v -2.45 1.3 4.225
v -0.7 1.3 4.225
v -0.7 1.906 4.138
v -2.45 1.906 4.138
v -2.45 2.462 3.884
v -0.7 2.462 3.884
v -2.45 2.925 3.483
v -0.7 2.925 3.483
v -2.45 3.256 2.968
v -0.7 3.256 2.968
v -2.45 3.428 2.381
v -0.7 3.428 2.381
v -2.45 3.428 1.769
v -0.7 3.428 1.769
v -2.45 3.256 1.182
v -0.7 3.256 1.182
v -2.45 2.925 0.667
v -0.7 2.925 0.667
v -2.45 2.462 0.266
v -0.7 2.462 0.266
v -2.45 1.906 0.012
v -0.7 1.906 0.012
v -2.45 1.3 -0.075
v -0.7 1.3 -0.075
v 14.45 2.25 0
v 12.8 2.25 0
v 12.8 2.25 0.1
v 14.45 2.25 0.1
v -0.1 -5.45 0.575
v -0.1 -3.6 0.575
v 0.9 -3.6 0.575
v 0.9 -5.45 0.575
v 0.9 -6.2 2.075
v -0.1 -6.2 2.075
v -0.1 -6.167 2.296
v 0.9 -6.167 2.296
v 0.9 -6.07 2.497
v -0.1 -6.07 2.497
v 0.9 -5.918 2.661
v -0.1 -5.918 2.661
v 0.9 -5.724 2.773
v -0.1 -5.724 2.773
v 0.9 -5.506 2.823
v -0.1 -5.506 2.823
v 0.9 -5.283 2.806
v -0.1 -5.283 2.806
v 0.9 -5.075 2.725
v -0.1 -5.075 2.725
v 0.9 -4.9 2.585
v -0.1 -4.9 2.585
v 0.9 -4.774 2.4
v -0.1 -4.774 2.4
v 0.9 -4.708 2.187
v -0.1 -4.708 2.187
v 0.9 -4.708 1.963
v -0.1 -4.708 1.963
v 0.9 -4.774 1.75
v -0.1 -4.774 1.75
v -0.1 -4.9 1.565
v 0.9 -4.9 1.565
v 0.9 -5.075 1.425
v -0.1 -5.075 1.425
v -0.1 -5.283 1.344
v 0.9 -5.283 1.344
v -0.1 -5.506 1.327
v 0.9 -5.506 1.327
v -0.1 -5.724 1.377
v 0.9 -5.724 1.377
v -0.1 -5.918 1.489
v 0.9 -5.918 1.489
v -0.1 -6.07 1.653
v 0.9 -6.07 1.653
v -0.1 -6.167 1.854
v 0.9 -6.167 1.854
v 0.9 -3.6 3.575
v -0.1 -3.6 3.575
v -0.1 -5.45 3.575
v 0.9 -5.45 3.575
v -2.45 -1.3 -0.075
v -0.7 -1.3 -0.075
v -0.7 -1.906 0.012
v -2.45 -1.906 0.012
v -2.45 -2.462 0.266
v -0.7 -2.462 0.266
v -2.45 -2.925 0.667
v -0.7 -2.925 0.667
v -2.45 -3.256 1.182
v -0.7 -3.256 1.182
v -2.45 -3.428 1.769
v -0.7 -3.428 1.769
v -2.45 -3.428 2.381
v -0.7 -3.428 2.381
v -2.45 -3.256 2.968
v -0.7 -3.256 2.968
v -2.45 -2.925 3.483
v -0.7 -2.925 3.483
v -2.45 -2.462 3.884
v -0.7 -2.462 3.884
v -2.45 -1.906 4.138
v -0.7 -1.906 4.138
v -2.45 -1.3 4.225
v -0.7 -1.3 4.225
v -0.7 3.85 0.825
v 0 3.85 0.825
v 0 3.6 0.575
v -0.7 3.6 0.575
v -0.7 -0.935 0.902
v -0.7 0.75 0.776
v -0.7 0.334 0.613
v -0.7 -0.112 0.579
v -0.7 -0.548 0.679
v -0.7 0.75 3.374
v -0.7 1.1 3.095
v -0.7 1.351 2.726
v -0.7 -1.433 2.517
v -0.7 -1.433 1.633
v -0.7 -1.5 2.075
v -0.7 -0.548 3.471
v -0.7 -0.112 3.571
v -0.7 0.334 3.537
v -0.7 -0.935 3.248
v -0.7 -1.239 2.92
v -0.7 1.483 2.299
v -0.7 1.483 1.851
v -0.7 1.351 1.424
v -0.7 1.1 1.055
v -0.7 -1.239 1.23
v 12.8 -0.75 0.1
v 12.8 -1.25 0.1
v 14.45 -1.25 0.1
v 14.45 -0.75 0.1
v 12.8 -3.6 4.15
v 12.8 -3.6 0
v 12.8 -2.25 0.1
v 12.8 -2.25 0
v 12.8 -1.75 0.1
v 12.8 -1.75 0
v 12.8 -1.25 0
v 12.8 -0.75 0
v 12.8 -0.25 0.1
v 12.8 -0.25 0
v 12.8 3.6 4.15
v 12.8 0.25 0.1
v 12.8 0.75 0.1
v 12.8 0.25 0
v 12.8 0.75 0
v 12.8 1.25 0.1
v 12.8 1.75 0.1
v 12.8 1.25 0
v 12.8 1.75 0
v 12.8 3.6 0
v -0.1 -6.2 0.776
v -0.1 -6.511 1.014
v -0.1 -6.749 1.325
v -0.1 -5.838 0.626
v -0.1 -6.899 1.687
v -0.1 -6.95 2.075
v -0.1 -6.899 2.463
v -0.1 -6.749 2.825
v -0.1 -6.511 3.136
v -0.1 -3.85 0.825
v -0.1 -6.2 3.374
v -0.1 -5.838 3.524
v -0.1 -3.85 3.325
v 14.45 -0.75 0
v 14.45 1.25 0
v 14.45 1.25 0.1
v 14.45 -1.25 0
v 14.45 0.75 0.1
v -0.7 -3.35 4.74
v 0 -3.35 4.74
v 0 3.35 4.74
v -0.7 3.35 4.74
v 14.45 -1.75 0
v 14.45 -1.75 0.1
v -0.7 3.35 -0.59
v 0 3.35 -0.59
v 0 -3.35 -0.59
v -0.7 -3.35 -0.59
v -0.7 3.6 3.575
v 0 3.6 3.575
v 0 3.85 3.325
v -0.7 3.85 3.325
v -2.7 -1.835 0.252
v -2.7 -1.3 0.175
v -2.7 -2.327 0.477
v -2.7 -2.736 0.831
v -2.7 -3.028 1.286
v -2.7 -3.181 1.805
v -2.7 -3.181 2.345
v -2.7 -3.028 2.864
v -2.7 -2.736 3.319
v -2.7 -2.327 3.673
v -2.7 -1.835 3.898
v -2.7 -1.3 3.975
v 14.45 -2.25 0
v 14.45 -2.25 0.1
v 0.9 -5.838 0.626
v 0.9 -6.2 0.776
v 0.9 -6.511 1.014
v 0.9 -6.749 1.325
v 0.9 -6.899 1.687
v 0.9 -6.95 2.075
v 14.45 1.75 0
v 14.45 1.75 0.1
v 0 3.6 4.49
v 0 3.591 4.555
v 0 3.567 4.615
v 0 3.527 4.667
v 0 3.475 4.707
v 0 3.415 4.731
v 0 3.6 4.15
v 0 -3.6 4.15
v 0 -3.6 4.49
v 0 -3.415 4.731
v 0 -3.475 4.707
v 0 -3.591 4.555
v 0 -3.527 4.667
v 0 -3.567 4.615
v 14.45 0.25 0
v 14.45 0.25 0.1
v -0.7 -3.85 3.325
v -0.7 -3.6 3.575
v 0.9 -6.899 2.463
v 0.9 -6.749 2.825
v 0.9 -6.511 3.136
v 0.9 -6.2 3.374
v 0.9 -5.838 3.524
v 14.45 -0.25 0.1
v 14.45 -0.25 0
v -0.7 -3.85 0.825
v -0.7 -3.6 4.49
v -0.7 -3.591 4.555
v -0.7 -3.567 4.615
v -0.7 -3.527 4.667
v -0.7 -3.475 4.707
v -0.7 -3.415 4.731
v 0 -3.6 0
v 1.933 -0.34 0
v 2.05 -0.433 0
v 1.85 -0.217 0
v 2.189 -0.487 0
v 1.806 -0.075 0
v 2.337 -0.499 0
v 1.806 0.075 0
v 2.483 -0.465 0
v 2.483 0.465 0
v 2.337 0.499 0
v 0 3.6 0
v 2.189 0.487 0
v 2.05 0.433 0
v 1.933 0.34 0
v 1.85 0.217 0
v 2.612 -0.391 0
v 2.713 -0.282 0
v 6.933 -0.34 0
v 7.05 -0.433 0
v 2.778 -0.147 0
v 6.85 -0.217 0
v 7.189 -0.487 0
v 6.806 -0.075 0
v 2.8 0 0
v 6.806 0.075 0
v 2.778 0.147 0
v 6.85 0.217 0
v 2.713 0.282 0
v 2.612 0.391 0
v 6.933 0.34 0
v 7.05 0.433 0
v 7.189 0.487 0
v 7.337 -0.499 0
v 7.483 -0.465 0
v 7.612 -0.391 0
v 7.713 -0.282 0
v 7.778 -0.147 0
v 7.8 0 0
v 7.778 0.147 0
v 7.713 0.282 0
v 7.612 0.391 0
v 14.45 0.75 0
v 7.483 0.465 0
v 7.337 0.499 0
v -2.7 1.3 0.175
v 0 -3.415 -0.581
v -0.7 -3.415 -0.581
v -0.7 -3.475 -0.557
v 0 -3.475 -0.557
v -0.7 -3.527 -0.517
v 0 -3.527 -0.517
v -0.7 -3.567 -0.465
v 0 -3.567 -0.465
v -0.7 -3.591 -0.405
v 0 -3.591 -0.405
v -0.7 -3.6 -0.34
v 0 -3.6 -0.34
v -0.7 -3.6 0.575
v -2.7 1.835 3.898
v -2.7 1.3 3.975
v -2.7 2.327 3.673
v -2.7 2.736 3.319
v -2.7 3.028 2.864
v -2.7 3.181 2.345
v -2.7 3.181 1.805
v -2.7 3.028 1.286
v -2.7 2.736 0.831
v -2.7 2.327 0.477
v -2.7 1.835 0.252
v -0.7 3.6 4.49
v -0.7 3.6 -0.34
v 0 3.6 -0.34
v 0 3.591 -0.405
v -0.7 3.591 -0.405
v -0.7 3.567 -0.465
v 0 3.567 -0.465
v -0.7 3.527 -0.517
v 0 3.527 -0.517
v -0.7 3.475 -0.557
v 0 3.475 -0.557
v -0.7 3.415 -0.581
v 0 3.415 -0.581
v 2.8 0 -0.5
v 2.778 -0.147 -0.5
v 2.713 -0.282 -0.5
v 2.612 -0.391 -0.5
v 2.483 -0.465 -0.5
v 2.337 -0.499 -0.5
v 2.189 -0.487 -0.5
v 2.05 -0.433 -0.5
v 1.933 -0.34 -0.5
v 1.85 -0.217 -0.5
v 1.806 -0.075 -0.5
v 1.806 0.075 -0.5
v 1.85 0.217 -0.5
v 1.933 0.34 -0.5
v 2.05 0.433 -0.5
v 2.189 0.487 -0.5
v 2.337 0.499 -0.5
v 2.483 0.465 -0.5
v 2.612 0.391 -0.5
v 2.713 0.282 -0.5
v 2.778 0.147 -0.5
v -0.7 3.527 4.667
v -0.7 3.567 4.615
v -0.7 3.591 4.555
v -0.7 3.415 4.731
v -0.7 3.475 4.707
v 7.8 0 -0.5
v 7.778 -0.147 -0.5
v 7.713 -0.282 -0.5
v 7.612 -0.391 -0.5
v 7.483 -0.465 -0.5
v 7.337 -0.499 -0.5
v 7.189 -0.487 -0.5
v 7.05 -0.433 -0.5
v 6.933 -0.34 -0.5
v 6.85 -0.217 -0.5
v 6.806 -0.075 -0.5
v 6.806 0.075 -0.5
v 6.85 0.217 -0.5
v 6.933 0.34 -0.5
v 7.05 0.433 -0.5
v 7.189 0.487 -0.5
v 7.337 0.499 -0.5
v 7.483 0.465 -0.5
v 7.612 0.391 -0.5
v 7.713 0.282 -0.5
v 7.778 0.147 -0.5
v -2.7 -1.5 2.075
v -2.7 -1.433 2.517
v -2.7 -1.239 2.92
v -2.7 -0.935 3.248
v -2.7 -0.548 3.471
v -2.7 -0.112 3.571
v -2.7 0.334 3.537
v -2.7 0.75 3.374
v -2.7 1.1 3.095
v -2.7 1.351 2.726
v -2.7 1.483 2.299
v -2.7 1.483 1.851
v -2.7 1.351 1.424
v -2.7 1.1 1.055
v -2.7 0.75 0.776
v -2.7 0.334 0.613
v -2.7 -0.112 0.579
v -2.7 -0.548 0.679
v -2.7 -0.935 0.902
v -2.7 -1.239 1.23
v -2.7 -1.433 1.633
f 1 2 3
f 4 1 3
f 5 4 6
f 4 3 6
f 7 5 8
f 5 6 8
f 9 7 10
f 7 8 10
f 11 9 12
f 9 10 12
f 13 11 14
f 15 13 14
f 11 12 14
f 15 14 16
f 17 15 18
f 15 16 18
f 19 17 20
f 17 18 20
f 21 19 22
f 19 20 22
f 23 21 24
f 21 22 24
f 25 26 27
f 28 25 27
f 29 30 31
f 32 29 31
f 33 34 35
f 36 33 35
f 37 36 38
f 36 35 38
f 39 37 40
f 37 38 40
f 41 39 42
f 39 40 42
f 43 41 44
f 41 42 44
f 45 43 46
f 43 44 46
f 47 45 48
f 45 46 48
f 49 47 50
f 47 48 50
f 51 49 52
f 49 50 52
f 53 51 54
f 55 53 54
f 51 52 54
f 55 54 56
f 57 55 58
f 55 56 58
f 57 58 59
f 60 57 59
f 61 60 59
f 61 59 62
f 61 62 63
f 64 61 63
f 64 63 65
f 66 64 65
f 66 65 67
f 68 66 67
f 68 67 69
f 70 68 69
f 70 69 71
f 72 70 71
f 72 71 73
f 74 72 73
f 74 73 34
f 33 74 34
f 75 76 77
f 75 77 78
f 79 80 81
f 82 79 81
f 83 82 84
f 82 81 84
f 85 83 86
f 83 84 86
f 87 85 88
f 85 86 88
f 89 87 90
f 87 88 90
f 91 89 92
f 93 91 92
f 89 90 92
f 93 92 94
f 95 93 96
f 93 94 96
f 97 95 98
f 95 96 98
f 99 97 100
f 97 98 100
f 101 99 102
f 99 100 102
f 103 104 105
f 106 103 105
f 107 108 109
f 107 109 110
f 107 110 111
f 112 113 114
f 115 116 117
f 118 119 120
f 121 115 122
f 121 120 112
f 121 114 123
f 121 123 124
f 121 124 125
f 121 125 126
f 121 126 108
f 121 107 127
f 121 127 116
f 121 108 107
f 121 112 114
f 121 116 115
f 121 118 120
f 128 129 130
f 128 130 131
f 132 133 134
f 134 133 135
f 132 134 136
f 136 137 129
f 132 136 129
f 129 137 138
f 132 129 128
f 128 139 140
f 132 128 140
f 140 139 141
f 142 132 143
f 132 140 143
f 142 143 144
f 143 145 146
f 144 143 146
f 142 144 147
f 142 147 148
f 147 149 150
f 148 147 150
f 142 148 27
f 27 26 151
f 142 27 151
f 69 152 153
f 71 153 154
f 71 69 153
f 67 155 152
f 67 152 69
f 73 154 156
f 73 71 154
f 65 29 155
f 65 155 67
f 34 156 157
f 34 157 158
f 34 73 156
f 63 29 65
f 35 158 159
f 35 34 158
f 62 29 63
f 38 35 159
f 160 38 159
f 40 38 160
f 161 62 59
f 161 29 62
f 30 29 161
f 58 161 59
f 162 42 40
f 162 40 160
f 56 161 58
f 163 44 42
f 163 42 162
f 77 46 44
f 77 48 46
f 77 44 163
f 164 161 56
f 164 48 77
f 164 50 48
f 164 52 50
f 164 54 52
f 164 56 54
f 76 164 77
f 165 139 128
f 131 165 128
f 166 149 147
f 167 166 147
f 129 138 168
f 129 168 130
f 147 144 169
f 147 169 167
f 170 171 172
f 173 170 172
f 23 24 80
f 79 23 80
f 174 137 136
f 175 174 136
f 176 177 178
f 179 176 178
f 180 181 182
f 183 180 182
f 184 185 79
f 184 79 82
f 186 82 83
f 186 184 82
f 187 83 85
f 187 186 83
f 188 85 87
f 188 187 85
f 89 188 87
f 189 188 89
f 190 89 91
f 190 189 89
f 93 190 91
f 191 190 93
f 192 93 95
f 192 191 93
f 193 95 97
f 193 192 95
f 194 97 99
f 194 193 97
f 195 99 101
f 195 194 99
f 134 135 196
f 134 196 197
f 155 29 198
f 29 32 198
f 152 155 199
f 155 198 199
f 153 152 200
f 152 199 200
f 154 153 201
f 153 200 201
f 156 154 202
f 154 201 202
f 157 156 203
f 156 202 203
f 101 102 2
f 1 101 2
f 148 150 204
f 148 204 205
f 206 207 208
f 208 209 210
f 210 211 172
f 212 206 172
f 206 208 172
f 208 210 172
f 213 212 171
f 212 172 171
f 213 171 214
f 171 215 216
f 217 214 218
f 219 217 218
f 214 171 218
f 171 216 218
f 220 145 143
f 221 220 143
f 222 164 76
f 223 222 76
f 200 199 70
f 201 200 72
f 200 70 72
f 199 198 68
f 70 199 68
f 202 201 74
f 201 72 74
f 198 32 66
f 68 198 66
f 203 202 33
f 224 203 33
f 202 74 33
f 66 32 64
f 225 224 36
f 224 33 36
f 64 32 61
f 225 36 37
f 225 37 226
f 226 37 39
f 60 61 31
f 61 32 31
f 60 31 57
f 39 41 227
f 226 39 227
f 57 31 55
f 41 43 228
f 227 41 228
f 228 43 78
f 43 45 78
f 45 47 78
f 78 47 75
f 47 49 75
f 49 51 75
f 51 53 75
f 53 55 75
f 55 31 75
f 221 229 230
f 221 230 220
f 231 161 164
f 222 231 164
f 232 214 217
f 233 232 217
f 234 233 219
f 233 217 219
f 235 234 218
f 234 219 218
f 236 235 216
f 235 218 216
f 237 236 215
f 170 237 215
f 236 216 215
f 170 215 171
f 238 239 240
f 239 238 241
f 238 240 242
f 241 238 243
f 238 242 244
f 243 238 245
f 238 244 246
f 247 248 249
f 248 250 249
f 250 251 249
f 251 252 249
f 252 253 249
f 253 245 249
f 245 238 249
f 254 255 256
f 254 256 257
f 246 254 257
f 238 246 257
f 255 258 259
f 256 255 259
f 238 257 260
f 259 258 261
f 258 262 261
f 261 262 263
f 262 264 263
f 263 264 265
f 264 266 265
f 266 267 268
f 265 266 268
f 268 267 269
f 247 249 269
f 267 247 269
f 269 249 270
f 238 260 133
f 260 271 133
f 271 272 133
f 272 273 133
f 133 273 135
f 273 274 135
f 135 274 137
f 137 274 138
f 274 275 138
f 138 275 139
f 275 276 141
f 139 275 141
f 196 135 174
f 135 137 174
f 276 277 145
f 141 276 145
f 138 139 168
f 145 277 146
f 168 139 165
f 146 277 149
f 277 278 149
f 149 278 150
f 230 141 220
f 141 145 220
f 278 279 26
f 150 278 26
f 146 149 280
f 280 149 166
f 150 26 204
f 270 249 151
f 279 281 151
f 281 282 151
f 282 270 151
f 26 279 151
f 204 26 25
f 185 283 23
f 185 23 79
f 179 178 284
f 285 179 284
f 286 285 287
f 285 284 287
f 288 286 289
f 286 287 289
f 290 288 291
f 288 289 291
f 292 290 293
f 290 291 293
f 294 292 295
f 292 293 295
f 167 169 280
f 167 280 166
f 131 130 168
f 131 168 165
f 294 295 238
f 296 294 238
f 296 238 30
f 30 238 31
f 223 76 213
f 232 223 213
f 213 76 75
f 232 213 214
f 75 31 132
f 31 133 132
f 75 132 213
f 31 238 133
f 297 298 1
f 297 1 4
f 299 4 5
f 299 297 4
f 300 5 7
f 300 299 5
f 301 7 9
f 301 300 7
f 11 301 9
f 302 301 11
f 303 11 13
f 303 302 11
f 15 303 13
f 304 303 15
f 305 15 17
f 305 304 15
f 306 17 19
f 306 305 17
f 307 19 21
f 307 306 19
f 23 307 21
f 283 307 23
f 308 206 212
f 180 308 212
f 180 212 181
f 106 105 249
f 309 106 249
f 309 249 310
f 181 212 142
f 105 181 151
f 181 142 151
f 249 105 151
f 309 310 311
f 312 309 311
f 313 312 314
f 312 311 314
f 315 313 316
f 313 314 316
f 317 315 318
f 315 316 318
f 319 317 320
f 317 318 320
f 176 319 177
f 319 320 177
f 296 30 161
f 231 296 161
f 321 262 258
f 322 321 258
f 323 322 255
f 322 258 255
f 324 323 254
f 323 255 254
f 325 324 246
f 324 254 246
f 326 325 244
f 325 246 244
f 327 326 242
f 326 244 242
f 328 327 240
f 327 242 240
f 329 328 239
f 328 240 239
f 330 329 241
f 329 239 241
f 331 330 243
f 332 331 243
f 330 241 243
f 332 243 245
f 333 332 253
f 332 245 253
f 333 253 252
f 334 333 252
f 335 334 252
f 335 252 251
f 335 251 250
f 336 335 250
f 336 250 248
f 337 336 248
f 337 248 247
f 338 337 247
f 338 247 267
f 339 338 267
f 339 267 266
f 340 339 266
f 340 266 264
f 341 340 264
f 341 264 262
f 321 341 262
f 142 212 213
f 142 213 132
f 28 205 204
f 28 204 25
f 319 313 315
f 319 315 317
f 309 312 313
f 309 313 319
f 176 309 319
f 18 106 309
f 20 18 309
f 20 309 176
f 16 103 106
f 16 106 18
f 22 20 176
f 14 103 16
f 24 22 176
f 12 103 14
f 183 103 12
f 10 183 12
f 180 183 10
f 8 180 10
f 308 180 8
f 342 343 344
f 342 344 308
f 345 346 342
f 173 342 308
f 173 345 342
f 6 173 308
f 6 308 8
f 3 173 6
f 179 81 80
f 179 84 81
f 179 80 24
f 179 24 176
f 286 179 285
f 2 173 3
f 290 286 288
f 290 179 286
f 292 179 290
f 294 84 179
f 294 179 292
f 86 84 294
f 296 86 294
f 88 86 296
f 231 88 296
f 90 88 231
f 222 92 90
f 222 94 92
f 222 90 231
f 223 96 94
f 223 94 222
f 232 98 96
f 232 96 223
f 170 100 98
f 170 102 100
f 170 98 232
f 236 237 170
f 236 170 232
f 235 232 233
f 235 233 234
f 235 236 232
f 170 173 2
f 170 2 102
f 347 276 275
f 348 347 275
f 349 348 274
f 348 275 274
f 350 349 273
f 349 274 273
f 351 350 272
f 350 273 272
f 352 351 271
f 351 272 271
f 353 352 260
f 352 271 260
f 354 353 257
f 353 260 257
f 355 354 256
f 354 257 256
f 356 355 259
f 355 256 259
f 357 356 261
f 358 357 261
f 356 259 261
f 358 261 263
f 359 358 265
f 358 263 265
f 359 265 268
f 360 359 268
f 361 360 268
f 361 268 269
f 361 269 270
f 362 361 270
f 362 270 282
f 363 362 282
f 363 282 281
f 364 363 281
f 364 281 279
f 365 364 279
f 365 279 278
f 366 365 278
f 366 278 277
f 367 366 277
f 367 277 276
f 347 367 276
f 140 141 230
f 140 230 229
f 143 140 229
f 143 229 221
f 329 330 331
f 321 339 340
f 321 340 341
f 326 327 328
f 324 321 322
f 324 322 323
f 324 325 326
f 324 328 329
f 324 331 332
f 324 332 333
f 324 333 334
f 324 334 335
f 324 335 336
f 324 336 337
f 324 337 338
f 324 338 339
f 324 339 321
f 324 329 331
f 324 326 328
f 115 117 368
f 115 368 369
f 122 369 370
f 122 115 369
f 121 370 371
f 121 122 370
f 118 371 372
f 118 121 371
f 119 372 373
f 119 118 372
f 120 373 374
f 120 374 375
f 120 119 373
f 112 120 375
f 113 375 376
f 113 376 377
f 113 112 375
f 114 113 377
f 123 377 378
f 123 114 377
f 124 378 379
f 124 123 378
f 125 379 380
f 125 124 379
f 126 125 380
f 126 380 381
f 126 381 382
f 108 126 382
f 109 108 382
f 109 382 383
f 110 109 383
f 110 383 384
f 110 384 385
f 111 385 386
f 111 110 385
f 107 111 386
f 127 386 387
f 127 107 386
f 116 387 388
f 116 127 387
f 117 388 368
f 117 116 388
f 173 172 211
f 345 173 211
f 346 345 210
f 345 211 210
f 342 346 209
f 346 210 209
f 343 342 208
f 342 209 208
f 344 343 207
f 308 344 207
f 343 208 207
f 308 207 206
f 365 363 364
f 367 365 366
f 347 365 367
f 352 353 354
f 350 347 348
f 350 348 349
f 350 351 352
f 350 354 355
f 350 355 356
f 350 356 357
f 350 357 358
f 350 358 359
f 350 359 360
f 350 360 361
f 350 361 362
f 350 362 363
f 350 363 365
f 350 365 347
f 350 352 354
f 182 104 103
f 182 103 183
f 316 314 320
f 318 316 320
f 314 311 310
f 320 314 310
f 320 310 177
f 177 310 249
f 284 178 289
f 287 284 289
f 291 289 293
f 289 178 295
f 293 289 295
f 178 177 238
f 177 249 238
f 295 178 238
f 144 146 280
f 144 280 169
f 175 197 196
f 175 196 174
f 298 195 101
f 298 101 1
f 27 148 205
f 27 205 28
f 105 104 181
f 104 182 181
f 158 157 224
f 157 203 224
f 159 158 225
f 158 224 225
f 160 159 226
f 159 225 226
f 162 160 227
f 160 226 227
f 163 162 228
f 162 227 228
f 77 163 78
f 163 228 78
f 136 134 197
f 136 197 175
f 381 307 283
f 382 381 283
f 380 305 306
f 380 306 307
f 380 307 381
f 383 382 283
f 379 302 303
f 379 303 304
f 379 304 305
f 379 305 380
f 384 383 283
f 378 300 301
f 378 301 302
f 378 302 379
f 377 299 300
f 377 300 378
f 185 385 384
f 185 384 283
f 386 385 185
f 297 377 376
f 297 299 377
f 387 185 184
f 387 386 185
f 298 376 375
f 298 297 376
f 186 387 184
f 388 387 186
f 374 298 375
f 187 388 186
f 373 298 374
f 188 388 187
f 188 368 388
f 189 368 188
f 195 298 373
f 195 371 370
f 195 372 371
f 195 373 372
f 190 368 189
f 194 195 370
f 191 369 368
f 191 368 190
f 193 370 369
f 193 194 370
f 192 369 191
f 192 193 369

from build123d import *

# Parameters (mm, degrees)
F0_W      = 12.8
F0_H      = 7.2
F1_DEPTH  = 4.15
F2_W      = 0.25
F2_H      = 2.5
F2_W_2    = 7.2
F3_DEPTH  = 0.7
F4_R      = 1.5
F5_DEPTH  = 2
F6_SIZE   = 0.25
F7_W      = 1
F7_H      = 3
F8_DEPTH  = 3.35
F9_R      = 1.49999
F10_R     = 0.75
F11_DEPTH = 25
F12_R     = 0.5
F13_DEPTH = 0.5
F14_W     = 0.5
F14_H     = 0.1
F15_DEPTH = 14.45


# Not quite as in the source:
# - a fillet or chamfer is up to 0.001 mm smaller than in the source, because OpenCascade refuses the exact size


with BuildPart() as f1:
    # F0 (on Top) → F1 (new body)
    with BuildSketch(Plane.XY):
        with Locations((6.4, 0)):
            Rectangle(F0_W, F0_H)
    extrude(amount=F1_DEPTH)

    # F2 (on face) → F3 (join)
    with BuildSketch(Plane(origin=(0, 0, 0), x_dir=(0, -1, 0), z_dir=(-1, 0, 0))):
        with BuildLine():
            Line((3.35, 4.74), (-3.35, 4.74))
            ThreePointArc((-3.35, 4.74), (-3.5267766953, 4.6667766953), (-3.6, 4.49))
            Line((-3.6, 4.49), (-3.6, 3.575))
            Line((-3.6, 3.575), (-3.6, 3.325))
            Line((-3.6, 3.325), (3.6, 3.325))
            Line((3.6, 3.325), (3.6, 3.575))
            Line((3.6, 3.575), (3.6, 4.49))
            ThreePointArc((3.6, 4.49), (3.5267766953, 4.6667766953), (3.35, 4.74))
        make_face()
        Polygon((-3.6, 3.325), (-3.6, 3.575), (-3.85, 3.325), align=None)
        Polygon((3.85, 3.325), (3.6, 3.575), (3.6, 3.325), align=None)
        with Locations((-3.725, 2.075)):
            Rectangle(F2_W, F2_H)
        with Locations((3.725, 2.075)):
            Rectangle(F2_W, F2_H)
        with BuildLine():
            Line((3.6, 0.825), (-3.6, 0.825))
            Line((-3.6, 0.825), (-3.6, 0.575))
            Line((-3.6, 0.575), (-3.6, -0.34))
            ThreePointArc((-3.6, -0.34), (-3.5267766953, -0.5167766953), (-3.35, -0.59))
            Line((-3.35, -0.59), (3.35, -0.59))
            ThreePointArc((3.35, -0.59), (3.5267766953, -0.5167766953), (3.6, -0.34))
            Line((3.6, -0.34), (3.6, 0.575))
            Line((3.6, 0.575), (3.6, 0.825))
        make_face()
        Polygon((-3.6, 0.575), (-3.6, 0.825), (-3.85, 0.825), align=None)
        Polygon((3.85, 0.825), (3.6, 0.825), (3.6, 0.575), align=None)
        with Locations((0, 2.075)):
            Rectangle(F2_W_2, F2_H)
    extrude(amount=F3_DEPTH)

    # F4 (on face) → F5 (join)
    with BuildSketch(Plane(origin=(-0.7, 0, 0), x_dir=(0, -1, 0), z_dir=(-1, 0, 0))):
        with BuildLine():
            ThreePointArc((1.3, -0.075), (3.45, 2.075), (1.3, 4.225))
            Line((1.3, 4.225), (-1.3, 4.225))
            ThreePointArc((-1.3, 4.225), (-3.45, 2.075), (-1.3, -0.075))
            Line((-1.3, -0.075), (1.3, -0.075))
        make_face()
        with Locations((0, 2.075)):
            Circle(F4_R, mode=Mode.SUBTRACT)
    extrude(amount=F5_DEPTH)

    # F6
    f6_edges = [f1.edges().sort_by_distance(p)[0] for p in [
        (-2.7, 0, 4.225),
    ]]
    chamfer(f6_edges, length=F6_SIZE)

    # F7 (on face) → F8 (join)
    with BuildSketch(Plane.XZ.offset(3.6)):
        with Locations((0.4, 2.075)):
            Rectangle(F7_W, F7_H)
    extrude(amount=F8_DEPTH)

    # F9 (radius 1.5 in the source; OpenCascade refuses exactly that, so slightly less here)
    f9_edges = [f1.edges().sort_by_distance(p)[0] for p in [
        (0.4, -6.95, 3.575),
        (0.4, -6.95, 0.575),
    ]]
    fillet(f9_edges, radius=F9_R)

    # F10 (on face) → F11 (cut)
    with BuildSketch(Plane(origin=(-0.1, 0, 0), x_dir=(0, -1, 0), z_dir=(-1, 0, 0))):
        with Locations((5.45, 2.075)):
            Circle(F10_R)
    extrude(amount=-F11_DEPTH, mode=Mode.SUBTRACT)

    # F12 (on face) → F13 (join)
    with BuildSketch(Plane(origin=(0, 0, 0), x_dir=(1, 0, 0), z_dir=(0, 0, -1))):
        with Locations((2.3, 0)):
            Circle(F12_R)
        with Locations((7.3, 0)):
            Circle(F12_R)
    extrude(amount=F13_DEPTH)

    # F14 (on face) → F15 (join)
    with BuildSketch(Plane.YZ):
        with Locations((0, 0.05)):
            Rectangle(F14_W, F14_H)
        with Locations((1, 0.05)):
            Rectangle(F14_W, F14_H)
        with Locations((2, 0.05)):
            Rectangle(F14_W, F14_H)
        with Locations((-1, 0.05)):
            Rectangle(F14_W, F14_H)
        with Locations((-2, 0.05)):
            Rectangle(F14_W, F14_H)
    extrude(amount=F15_DEPTH)


solid = f1.part
